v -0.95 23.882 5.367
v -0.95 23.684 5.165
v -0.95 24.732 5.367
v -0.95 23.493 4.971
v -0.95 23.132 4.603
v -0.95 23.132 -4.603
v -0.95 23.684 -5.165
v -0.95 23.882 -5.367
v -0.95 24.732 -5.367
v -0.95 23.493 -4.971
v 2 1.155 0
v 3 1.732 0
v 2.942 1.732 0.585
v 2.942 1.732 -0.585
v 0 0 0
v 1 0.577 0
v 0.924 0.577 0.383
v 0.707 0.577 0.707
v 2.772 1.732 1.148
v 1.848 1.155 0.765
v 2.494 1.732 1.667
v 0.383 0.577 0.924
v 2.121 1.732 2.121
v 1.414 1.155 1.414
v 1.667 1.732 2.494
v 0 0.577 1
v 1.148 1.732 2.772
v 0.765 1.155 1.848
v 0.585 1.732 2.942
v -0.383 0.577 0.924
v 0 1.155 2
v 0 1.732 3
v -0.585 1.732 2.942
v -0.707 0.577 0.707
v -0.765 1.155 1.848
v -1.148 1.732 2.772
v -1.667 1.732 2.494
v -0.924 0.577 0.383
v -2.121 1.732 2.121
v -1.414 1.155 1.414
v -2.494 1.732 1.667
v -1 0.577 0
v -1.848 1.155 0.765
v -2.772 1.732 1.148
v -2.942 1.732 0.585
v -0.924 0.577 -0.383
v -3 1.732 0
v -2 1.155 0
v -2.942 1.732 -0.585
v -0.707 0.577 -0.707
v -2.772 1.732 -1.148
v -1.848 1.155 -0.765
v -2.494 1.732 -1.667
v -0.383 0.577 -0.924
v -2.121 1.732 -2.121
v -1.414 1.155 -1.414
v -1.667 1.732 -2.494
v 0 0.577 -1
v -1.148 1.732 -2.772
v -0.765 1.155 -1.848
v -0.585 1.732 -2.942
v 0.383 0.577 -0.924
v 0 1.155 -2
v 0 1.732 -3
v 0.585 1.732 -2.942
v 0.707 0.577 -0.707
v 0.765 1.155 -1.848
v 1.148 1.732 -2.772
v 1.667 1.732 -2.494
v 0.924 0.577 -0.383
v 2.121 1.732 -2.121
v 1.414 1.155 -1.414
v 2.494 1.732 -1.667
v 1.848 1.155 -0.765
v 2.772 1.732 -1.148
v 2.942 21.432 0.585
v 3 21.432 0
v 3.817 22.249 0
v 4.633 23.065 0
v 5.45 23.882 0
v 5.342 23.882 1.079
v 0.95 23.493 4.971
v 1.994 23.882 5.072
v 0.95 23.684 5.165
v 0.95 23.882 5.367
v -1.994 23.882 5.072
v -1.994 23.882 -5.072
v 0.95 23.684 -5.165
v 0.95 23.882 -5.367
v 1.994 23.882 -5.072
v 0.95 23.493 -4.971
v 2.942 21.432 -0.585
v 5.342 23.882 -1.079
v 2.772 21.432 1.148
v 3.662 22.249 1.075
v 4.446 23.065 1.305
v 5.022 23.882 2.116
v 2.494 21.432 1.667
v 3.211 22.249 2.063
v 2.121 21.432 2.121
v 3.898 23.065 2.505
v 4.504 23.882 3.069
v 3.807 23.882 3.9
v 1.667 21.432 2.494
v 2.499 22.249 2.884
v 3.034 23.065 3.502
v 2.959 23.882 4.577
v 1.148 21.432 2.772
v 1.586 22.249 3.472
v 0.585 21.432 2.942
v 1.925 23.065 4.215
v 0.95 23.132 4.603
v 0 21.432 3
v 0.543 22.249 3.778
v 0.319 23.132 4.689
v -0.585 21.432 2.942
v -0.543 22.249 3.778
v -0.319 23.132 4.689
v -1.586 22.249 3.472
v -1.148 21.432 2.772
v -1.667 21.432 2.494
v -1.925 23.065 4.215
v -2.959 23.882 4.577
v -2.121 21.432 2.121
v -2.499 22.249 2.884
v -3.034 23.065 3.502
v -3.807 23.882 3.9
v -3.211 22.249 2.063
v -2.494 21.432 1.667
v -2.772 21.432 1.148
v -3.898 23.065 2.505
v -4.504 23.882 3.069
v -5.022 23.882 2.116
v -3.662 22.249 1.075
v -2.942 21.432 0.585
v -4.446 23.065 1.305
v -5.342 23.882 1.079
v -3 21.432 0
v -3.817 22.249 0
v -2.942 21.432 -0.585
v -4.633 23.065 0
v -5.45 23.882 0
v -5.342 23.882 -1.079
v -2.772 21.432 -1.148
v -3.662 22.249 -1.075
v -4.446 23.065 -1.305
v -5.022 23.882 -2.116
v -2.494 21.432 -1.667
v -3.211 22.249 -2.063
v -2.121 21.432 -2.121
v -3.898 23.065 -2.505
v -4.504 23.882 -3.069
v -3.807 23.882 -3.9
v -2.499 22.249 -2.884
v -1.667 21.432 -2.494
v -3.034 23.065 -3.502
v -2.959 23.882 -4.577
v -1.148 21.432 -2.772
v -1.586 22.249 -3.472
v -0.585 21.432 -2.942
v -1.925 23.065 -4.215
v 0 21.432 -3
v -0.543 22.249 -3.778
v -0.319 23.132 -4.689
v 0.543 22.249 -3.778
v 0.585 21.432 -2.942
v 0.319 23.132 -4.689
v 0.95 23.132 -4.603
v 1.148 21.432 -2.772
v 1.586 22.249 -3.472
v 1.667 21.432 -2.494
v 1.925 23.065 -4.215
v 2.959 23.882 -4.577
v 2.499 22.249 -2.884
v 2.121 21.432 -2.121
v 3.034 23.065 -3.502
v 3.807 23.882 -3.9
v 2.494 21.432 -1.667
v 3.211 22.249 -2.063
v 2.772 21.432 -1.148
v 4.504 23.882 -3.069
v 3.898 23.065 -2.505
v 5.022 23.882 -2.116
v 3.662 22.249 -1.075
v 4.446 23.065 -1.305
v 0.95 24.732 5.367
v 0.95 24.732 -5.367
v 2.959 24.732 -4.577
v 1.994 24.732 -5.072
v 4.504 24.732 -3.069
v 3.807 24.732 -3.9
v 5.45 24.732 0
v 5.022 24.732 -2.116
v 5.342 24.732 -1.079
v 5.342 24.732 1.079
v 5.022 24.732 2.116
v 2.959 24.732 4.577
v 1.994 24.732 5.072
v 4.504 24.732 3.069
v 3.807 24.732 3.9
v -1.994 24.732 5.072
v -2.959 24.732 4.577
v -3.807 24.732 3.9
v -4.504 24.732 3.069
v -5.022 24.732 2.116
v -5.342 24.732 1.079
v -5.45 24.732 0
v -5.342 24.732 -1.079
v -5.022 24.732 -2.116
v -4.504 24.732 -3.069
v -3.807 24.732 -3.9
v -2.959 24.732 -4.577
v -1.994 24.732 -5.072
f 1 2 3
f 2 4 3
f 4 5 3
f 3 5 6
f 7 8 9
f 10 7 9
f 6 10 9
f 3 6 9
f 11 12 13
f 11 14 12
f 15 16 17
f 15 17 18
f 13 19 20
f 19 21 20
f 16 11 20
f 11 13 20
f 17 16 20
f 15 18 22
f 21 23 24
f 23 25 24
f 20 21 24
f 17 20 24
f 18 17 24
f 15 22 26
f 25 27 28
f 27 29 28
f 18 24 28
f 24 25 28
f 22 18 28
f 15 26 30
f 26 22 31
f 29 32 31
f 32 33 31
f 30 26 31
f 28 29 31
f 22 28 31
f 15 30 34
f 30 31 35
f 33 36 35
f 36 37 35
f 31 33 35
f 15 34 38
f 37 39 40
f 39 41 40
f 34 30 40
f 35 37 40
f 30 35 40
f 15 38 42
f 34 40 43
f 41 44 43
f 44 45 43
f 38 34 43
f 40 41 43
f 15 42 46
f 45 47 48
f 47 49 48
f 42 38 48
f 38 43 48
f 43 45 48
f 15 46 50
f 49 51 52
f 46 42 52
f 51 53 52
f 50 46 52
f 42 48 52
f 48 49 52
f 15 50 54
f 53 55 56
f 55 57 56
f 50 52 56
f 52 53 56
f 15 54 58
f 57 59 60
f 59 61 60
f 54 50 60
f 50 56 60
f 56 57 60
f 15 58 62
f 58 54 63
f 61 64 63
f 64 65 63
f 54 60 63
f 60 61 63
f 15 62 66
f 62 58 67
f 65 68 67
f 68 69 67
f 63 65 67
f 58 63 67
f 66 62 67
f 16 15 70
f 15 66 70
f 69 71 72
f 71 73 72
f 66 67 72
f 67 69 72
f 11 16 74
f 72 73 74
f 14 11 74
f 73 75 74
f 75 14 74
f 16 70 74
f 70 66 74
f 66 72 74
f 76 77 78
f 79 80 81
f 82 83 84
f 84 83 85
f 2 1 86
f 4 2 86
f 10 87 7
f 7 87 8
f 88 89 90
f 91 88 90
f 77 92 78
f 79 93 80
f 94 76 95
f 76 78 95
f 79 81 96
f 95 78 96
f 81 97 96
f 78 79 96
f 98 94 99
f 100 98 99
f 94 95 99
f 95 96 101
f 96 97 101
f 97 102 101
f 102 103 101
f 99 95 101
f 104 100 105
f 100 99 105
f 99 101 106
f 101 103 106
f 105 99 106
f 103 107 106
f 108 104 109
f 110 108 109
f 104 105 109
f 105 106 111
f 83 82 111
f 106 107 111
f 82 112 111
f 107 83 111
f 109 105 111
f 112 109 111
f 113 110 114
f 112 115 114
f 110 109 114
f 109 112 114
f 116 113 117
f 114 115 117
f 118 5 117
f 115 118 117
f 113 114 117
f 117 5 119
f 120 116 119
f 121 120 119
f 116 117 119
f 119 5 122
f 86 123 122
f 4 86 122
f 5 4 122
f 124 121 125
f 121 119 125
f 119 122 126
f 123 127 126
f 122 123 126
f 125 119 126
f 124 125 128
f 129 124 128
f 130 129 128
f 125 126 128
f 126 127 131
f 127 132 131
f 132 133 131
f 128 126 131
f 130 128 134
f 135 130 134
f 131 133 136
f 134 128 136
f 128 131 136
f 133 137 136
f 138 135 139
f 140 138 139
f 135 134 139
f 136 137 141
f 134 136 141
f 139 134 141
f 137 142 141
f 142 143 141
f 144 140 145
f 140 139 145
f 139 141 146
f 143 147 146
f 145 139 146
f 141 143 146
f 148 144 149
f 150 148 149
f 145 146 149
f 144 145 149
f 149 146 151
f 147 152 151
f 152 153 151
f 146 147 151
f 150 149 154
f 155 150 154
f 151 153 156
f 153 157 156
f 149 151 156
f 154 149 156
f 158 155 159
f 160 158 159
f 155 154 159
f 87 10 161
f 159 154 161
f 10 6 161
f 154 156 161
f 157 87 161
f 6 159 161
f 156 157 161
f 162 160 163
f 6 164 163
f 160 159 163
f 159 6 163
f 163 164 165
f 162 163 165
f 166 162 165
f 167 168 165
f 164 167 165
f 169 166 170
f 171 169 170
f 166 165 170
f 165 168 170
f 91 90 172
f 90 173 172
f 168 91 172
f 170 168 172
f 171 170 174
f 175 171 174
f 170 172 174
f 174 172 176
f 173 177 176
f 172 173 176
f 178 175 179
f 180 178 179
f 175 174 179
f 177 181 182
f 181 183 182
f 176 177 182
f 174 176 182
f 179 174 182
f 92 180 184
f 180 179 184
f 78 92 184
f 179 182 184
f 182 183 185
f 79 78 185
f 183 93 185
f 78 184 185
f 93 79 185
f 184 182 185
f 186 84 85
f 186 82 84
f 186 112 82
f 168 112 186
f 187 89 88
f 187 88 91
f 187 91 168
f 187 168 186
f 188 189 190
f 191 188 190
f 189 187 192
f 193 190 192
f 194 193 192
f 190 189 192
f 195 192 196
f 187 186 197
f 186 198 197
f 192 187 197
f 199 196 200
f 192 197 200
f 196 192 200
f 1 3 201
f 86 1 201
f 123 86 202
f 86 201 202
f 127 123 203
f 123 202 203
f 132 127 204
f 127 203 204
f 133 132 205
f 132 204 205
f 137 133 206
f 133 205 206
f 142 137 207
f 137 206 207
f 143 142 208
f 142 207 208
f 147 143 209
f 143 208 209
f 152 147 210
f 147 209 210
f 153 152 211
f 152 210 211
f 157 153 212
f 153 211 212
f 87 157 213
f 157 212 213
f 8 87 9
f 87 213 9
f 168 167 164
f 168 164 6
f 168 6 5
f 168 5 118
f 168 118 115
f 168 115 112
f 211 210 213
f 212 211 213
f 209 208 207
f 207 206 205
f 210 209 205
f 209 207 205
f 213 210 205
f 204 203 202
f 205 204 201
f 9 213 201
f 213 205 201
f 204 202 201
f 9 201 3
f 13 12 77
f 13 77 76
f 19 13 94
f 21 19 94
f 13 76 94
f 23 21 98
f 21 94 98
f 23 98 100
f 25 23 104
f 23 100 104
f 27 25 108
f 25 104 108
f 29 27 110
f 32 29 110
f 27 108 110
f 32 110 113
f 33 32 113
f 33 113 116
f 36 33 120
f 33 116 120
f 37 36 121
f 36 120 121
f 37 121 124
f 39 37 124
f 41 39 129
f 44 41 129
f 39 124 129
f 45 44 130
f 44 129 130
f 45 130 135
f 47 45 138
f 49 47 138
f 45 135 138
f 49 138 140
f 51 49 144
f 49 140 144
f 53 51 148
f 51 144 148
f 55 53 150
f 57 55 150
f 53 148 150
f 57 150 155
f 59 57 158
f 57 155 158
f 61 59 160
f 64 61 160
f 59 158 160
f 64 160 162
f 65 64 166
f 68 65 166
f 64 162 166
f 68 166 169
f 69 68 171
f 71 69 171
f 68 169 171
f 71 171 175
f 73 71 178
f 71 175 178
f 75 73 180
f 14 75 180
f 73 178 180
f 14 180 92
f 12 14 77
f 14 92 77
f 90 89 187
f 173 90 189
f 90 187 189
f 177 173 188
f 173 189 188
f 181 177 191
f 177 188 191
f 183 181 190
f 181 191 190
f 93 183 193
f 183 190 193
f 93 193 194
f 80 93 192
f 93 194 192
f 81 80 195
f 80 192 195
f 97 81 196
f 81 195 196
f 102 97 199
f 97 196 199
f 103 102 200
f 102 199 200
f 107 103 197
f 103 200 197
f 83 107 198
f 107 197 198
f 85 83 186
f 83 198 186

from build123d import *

# Parameters (mm, degrees)
SKETCH2_W               = 1.9
SKETCH2_H               = 3.2
CUT_EXTRUDE1_DEPTH      = 6.45
CUT_EXTRUDE1_DEPTH_BACK = 6.45


with BuildPart() as part:
    # Sketch1 → Revolve1 (revolve)
    with BuildSketch(Plane.XY):
        Polygon((0, 0), (3, 1.732050808), (3, 21.432050808), (5.45, 23.882050808), (5.45, 24.732050808), (0, 24.732050808), align=None)
    revolve(axis=Axis((0, 24.732050808, 0), (0, -1, 0)))

    # Sketch2 → Cut-Extrude1 (cut, two sides)
    with BuildSketch(Plane.XY) as cut_extrude1_sk:
        with Locations((0, 24.732050808)):
            Rectangle(SKETCH2_W, SKETCH2_H)
    extrude(amount=CUT_EXTRUDE1_DEPTH, mode=Mode.SUBTRACT)
    extrude(cut_extrude1_sk.sketch, amount=-CUT_EXTRUDE1_DEPTH_BACK, mode=Mode.SUBTRACT)


solid = part.part
